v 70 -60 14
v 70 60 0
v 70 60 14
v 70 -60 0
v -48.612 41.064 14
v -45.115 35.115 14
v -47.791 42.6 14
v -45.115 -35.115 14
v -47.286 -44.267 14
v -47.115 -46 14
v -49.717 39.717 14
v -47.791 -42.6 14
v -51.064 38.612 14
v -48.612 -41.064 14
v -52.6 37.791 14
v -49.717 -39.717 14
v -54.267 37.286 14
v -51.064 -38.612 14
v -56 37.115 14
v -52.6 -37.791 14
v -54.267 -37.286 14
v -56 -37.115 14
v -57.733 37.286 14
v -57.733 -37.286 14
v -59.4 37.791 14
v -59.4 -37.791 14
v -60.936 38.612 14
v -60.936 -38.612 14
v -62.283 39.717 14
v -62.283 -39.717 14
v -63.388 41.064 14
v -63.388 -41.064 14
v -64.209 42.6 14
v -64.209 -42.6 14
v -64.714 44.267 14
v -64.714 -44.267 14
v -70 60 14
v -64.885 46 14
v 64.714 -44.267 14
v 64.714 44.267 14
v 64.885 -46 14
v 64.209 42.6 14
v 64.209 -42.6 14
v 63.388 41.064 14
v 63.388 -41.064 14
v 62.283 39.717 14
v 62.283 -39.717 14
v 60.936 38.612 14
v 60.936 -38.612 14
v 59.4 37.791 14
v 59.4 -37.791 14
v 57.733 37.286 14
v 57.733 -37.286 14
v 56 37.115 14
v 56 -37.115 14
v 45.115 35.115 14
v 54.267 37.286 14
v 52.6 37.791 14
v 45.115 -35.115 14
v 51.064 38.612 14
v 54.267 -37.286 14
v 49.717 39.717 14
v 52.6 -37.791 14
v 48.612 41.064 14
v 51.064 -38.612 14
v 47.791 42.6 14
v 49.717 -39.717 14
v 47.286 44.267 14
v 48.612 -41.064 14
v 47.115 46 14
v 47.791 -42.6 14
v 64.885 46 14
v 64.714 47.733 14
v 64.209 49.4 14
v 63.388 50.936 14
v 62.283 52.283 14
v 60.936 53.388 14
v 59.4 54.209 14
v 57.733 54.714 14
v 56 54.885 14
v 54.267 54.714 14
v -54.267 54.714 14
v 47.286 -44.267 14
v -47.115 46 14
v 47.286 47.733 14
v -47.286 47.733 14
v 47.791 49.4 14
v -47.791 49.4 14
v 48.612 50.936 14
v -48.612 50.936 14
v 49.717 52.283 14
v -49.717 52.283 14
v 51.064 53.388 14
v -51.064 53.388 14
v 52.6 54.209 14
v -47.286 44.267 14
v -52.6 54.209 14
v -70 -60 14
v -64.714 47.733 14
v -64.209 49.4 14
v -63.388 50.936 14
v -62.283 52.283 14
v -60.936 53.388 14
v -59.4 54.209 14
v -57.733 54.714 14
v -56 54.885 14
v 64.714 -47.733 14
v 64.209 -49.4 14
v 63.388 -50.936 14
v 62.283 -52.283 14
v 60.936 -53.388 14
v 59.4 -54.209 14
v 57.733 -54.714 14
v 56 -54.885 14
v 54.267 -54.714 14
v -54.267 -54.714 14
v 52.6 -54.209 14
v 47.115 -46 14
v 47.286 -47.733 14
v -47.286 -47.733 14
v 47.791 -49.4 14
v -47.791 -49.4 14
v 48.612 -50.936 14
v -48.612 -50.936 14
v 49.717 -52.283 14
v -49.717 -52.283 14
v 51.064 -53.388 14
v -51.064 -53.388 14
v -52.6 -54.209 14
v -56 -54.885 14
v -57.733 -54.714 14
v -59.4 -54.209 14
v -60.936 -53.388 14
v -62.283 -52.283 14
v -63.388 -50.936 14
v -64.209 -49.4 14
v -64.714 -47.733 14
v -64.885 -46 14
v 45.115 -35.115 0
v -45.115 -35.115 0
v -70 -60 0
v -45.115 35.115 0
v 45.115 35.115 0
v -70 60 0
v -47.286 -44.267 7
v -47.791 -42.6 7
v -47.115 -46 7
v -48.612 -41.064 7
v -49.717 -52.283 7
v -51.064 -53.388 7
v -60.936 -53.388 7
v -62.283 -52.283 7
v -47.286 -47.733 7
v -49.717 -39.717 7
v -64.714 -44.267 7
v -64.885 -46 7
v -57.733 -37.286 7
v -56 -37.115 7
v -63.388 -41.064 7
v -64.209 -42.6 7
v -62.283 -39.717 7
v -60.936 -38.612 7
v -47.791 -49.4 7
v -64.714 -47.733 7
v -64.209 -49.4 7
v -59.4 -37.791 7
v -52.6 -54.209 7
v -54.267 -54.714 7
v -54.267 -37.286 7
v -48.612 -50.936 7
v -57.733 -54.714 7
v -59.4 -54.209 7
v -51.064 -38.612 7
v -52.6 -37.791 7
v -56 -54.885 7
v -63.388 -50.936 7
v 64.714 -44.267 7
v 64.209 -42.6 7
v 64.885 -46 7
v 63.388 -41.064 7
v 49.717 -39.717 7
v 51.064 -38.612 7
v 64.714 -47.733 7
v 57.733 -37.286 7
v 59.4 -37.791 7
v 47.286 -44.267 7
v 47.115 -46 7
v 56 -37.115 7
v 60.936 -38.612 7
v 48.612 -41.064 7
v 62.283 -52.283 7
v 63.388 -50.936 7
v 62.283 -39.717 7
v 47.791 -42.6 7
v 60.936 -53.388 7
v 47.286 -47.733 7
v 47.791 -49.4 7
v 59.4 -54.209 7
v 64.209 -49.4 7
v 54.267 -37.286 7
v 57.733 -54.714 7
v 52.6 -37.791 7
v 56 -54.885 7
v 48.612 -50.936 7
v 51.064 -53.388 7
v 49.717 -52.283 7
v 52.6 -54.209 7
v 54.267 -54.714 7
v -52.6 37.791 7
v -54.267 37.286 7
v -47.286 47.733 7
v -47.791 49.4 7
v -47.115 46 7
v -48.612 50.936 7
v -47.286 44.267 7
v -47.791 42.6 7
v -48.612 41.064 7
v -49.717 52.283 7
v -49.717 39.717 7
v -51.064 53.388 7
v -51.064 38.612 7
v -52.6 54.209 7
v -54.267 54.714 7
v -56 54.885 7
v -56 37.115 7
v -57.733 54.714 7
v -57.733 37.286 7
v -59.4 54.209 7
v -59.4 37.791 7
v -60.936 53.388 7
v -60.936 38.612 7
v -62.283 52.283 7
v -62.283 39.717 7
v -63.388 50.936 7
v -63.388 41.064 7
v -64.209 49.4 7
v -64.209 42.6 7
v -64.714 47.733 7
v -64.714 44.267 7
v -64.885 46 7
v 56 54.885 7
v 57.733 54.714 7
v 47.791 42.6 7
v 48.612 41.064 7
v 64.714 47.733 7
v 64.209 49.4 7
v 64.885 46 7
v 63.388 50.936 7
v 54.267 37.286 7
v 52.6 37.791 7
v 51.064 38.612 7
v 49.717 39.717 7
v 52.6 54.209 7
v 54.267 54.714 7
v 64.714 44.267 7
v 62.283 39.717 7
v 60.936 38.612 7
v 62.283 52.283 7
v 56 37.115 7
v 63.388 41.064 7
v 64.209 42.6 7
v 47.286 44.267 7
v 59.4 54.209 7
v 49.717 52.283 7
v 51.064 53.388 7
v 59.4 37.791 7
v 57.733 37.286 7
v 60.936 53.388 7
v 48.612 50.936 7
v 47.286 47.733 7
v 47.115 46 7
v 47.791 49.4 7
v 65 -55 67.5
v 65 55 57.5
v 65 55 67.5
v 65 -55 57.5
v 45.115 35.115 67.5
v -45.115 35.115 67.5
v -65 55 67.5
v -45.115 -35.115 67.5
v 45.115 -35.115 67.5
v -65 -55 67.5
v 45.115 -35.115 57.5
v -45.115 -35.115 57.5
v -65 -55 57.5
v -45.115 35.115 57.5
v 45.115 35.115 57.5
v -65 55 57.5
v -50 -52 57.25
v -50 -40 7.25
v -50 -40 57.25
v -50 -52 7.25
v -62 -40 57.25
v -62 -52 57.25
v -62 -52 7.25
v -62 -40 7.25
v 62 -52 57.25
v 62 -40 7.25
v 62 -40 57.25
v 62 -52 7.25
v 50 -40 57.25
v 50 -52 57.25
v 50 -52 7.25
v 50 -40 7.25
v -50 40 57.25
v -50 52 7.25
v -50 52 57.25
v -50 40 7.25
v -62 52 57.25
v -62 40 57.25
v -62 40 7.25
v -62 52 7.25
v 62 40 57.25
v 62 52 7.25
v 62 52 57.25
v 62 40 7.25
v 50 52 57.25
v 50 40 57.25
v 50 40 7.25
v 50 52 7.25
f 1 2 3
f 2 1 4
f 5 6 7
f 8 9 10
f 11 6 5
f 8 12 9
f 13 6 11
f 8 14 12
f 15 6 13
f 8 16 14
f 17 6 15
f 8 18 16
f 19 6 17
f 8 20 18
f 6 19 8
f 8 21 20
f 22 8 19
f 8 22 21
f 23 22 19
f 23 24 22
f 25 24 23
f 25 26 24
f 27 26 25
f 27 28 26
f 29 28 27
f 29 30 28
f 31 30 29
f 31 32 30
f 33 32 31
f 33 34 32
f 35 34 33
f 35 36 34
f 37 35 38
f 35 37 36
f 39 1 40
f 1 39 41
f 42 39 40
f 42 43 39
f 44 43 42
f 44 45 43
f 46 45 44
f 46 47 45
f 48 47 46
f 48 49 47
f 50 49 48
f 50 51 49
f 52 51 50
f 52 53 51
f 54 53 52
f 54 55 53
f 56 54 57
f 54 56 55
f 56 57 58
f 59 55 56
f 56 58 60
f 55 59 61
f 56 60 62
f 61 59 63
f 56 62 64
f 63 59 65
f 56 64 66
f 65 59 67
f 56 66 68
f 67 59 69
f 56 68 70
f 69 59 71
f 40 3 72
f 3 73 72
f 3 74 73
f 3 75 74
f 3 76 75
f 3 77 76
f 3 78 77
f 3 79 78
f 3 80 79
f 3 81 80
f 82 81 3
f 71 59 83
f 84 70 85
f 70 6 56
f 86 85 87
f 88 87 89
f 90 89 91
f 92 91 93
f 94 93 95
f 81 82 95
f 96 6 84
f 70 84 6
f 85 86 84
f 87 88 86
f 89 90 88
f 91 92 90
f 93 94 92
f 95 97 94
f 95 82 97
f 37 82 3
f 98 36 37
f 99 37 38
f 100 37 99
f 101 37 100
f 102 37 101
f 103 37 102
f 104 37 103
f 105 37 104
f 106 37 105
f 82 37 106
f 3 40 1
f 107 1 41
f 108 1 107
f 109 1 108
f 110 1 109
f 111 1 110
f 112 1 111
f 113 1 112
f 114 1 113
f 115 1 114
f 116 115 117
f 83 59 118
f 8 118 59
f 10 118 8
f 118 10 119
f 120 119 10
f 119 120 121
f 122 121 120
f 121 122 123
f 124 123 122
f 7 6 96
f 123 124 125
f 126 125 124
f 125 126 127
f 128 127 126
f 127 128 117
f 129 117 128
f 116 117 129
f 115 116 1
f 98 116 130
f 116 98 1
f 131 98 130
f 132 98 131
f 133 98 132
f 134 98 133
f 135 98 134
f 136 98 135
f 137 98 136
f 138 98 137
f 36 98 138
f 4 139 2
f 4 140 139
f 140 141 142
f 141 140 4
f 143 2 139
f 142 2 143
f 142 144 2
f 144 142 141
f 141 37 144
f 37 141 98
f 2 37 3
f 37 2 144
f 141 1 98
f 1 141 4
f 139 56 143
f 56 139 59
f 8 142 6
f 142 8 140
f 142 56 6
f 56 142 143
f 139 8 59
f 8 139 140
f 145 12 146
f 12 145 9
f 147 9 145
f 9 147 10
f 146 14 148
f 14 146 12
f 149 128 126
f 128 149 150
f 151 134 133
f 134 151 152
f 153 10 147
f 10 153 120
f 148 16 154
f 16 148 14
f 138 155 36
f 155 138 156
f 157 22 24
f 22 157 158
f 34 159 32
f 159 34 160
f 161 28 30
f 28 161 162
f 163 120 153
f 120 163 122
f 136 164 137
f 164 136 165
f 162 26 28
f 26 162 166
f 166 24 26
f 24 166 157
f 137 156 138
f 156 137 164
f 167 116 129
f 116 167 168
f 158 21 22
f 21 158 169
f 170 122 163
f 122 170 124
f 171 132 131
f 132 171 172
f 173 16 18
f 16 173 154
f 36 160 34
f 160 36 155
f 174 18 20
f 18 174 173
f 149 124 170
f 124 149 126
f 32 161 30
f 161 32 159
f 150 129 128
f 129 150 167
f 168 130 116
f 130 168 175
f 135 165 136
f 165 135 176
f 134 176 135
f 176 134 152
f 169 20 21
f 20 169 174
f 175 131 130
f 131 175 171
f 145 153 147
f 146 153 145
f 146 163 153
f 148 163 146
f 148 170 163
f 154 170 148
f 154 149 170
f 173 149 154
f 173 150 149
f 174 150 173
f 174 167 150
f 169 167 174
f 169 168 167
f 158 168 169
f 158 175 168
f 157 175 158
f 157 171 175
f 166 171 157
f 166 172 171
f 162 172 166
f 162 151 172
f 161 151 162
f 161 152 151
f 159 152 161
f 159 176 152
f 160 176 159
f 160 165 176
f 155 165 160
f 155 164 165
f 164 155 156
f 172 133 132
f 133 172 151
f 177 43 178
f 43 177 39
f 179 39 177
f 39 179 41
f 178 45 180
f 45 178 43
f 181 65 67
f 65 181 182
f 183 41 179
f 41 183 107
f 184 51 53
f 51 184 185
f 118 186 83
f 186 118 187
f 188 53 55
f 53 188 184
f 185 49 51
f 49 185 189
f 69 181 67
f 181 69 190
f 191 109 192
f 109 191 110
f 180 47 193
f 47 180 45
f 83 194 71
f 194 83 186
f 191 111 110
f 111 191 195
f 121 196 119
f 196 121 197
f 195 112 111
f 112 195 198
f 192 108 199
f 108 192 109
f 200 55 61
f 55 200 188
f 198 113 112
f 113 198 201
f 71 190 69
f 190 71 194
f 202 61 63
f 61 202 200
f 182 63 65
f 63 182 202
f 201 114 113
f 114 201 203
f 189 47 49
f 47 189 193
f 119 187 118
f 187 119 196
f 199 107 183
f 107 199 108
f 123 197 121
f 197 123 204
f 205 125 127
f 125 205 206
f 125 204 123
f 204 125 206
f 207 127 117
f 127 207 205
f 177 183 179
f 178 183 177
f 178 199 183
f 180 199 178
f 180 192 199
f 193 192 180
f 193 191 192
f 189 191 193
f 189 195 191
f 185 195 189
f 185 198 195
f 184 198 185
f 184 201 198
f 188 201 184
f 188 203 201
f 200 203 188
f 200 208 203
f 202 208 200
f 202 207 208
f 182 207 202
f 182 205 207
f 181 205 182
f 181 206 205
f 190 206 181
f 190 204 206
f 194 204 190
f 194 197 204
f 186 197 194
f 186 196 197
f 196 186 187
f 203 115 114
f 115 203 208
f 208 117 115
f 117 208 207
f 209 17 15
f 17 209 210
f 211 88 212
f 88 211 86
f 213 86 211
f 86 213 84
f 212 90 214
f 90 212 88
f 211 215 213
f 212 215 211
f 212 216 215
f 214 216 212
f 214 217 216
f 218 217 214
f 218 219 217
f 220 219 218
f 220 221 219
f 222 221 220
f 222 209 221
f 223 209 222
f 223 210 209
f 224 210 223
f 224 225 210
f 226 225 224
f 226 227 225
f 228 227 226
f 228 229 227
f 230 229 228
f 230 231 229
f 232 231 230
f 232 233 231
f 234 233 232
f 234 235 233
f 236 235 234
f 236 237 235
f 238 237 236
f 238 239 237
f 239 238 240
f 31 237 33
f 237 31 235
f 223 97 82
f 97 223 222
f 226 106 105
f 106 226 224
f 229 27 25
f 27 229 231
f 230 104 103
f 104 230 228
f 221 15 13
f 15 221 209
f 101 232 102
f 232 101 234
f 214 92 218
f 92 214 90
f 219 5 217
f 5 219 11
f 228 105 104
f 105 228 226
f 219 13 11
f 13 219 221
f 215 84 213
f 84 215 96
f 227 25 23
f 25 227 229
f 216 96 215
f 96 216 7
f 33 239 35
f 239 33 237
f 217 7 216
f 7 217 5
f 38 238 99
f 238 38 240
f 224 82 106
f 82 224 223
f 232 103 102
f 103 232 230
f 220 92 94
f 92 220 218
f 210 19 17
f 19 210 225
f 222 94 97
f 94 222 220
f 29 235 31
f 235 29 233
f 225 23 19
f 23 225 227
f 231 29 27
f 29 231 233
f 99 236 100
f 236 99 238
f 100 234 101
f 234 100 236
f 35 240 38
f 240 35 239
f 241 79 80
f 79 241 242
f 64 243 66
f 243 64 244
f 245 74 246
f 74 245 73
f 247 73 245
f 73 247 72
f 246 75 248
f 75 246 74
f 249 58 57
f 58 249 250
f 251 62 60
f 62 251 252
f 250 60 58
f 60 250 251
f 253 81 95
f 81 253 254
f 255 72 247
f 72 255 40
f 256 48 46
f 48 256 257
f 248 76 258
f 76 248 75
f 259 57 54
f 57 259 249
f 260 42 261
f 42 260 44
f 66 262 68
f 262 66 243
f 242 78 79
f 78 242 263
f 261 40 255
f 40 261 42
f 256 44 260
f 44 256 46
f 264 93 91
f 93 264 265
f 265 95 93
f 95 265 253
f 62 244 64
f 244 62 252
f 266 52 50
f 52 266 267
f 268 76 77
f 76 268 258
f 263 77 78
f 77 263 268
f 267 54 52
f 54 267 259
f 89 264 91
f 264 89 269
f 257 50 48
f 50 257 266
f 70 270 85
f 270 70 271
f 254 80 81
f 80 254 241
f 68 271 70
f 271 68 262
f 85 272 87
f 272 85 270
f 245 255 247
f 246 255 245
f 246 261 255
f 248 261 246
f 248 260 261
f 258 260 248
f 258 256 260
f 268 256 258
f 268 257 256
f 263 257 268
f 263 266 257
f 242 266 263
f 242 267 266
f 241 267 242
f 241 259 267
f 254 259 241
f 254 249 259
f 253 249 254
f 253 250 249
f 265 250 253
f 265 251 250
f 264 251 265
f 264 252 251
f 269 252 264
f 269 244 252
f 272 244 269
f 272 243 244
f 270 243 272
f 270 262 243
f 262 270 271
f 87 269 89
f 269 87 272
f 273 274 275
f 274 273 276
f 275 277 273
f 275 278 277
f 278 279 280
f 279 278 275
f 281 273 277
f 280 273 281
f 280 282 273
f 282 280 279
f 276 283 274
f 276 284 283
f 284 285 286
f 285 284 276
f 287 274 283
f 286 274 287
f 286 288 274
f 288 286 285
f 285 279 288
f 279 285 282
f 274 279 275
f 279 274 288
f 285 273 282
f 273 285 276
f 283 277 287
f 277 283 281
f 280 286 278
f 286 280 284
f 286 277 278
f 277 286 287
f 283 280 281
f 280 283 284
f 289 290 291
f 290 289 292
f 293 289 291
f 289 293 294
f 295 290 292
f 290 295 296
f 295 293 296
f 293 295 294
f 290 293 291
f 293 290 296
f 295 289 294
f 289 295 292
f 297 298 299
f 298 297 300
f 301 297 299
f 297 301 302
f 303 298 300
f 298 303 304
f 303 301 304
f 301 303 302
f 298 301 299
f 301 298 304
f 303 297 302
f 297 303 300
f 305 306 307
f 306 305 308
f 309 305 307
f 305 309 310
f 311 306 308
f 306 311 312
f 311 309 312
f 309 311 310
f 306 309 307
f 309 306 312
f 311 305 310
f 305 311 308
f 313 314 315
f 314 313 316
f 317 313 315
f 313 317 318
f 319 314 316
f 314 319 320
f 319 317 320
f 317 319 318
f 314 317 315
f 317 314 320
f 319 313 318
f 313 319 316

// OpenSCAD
$fn = 32;

// ------------------------------------------------------------------------
// Frame cube: base 140 x 120 mm, posts 50 mm tall
// Every part is its own module, assembly() places every instance.
// ------------------------------------------------------------------------

// --- part 1 ---
module base_frame() {
  difference() {
    translate([-70, -60, 0]) cube([140, 120, 14]);
    translate([-45.115, -35.115, -1]) cube([90.23, 70.23, 16]);
    translate([-56, -46, 7]) cylinder(h = 8, d = 17.77);
    translate([56, -46, 7]) cylinder(h = 8, d = 17.77);
    translate([-56, 46, 7]) cylinder(h = 8, d = 17.77);
    translate([56, 46, 7]) cylinder(h = 8, d = 17.77);
  }
}

// --- part 2 ---
module corner_post() {
  translate([-6, -6, 0]) cube([12, 12, 50]);
}

// --- part 3 ---
module top_frame() {
  difference() {
    translate([-65, -55, 0]) cube([130, 110, 10]);
    translate([-45.115, -35.115, -1]) cube([90.23, 70.23, 12]);
  }
}

// --- assembly ---
module assembly() {
  color([0.80, 0.24, 0.20]) translate([0, 0, 0]) rotate([0, 0, 0]) base_frame();
  color([0.20, 0.45, 0.75]) translate([-56, -46, 7.25]) rotate([0, 0, 0]) corner_post();
  color([0.25, 0.62, 0.32]) translate([56, -46, 7.25]) rotate([0, 0, 0]) corner_post();
  color([0.92, 0.70, 0.18]) translate([-56, 46, 7.25]) rotate([0, 0, 0]) corner_post();
  color([0.58, 0.35, 0.70]) translate([56, 46, 7.25]) rotate([0, 0, 0]) corner_post();
  color([0.16, 0.66, 0.66]) translate([0, 0, 57.5]) rotate([0, 0, 0]) top_frame();
}

assembly();
